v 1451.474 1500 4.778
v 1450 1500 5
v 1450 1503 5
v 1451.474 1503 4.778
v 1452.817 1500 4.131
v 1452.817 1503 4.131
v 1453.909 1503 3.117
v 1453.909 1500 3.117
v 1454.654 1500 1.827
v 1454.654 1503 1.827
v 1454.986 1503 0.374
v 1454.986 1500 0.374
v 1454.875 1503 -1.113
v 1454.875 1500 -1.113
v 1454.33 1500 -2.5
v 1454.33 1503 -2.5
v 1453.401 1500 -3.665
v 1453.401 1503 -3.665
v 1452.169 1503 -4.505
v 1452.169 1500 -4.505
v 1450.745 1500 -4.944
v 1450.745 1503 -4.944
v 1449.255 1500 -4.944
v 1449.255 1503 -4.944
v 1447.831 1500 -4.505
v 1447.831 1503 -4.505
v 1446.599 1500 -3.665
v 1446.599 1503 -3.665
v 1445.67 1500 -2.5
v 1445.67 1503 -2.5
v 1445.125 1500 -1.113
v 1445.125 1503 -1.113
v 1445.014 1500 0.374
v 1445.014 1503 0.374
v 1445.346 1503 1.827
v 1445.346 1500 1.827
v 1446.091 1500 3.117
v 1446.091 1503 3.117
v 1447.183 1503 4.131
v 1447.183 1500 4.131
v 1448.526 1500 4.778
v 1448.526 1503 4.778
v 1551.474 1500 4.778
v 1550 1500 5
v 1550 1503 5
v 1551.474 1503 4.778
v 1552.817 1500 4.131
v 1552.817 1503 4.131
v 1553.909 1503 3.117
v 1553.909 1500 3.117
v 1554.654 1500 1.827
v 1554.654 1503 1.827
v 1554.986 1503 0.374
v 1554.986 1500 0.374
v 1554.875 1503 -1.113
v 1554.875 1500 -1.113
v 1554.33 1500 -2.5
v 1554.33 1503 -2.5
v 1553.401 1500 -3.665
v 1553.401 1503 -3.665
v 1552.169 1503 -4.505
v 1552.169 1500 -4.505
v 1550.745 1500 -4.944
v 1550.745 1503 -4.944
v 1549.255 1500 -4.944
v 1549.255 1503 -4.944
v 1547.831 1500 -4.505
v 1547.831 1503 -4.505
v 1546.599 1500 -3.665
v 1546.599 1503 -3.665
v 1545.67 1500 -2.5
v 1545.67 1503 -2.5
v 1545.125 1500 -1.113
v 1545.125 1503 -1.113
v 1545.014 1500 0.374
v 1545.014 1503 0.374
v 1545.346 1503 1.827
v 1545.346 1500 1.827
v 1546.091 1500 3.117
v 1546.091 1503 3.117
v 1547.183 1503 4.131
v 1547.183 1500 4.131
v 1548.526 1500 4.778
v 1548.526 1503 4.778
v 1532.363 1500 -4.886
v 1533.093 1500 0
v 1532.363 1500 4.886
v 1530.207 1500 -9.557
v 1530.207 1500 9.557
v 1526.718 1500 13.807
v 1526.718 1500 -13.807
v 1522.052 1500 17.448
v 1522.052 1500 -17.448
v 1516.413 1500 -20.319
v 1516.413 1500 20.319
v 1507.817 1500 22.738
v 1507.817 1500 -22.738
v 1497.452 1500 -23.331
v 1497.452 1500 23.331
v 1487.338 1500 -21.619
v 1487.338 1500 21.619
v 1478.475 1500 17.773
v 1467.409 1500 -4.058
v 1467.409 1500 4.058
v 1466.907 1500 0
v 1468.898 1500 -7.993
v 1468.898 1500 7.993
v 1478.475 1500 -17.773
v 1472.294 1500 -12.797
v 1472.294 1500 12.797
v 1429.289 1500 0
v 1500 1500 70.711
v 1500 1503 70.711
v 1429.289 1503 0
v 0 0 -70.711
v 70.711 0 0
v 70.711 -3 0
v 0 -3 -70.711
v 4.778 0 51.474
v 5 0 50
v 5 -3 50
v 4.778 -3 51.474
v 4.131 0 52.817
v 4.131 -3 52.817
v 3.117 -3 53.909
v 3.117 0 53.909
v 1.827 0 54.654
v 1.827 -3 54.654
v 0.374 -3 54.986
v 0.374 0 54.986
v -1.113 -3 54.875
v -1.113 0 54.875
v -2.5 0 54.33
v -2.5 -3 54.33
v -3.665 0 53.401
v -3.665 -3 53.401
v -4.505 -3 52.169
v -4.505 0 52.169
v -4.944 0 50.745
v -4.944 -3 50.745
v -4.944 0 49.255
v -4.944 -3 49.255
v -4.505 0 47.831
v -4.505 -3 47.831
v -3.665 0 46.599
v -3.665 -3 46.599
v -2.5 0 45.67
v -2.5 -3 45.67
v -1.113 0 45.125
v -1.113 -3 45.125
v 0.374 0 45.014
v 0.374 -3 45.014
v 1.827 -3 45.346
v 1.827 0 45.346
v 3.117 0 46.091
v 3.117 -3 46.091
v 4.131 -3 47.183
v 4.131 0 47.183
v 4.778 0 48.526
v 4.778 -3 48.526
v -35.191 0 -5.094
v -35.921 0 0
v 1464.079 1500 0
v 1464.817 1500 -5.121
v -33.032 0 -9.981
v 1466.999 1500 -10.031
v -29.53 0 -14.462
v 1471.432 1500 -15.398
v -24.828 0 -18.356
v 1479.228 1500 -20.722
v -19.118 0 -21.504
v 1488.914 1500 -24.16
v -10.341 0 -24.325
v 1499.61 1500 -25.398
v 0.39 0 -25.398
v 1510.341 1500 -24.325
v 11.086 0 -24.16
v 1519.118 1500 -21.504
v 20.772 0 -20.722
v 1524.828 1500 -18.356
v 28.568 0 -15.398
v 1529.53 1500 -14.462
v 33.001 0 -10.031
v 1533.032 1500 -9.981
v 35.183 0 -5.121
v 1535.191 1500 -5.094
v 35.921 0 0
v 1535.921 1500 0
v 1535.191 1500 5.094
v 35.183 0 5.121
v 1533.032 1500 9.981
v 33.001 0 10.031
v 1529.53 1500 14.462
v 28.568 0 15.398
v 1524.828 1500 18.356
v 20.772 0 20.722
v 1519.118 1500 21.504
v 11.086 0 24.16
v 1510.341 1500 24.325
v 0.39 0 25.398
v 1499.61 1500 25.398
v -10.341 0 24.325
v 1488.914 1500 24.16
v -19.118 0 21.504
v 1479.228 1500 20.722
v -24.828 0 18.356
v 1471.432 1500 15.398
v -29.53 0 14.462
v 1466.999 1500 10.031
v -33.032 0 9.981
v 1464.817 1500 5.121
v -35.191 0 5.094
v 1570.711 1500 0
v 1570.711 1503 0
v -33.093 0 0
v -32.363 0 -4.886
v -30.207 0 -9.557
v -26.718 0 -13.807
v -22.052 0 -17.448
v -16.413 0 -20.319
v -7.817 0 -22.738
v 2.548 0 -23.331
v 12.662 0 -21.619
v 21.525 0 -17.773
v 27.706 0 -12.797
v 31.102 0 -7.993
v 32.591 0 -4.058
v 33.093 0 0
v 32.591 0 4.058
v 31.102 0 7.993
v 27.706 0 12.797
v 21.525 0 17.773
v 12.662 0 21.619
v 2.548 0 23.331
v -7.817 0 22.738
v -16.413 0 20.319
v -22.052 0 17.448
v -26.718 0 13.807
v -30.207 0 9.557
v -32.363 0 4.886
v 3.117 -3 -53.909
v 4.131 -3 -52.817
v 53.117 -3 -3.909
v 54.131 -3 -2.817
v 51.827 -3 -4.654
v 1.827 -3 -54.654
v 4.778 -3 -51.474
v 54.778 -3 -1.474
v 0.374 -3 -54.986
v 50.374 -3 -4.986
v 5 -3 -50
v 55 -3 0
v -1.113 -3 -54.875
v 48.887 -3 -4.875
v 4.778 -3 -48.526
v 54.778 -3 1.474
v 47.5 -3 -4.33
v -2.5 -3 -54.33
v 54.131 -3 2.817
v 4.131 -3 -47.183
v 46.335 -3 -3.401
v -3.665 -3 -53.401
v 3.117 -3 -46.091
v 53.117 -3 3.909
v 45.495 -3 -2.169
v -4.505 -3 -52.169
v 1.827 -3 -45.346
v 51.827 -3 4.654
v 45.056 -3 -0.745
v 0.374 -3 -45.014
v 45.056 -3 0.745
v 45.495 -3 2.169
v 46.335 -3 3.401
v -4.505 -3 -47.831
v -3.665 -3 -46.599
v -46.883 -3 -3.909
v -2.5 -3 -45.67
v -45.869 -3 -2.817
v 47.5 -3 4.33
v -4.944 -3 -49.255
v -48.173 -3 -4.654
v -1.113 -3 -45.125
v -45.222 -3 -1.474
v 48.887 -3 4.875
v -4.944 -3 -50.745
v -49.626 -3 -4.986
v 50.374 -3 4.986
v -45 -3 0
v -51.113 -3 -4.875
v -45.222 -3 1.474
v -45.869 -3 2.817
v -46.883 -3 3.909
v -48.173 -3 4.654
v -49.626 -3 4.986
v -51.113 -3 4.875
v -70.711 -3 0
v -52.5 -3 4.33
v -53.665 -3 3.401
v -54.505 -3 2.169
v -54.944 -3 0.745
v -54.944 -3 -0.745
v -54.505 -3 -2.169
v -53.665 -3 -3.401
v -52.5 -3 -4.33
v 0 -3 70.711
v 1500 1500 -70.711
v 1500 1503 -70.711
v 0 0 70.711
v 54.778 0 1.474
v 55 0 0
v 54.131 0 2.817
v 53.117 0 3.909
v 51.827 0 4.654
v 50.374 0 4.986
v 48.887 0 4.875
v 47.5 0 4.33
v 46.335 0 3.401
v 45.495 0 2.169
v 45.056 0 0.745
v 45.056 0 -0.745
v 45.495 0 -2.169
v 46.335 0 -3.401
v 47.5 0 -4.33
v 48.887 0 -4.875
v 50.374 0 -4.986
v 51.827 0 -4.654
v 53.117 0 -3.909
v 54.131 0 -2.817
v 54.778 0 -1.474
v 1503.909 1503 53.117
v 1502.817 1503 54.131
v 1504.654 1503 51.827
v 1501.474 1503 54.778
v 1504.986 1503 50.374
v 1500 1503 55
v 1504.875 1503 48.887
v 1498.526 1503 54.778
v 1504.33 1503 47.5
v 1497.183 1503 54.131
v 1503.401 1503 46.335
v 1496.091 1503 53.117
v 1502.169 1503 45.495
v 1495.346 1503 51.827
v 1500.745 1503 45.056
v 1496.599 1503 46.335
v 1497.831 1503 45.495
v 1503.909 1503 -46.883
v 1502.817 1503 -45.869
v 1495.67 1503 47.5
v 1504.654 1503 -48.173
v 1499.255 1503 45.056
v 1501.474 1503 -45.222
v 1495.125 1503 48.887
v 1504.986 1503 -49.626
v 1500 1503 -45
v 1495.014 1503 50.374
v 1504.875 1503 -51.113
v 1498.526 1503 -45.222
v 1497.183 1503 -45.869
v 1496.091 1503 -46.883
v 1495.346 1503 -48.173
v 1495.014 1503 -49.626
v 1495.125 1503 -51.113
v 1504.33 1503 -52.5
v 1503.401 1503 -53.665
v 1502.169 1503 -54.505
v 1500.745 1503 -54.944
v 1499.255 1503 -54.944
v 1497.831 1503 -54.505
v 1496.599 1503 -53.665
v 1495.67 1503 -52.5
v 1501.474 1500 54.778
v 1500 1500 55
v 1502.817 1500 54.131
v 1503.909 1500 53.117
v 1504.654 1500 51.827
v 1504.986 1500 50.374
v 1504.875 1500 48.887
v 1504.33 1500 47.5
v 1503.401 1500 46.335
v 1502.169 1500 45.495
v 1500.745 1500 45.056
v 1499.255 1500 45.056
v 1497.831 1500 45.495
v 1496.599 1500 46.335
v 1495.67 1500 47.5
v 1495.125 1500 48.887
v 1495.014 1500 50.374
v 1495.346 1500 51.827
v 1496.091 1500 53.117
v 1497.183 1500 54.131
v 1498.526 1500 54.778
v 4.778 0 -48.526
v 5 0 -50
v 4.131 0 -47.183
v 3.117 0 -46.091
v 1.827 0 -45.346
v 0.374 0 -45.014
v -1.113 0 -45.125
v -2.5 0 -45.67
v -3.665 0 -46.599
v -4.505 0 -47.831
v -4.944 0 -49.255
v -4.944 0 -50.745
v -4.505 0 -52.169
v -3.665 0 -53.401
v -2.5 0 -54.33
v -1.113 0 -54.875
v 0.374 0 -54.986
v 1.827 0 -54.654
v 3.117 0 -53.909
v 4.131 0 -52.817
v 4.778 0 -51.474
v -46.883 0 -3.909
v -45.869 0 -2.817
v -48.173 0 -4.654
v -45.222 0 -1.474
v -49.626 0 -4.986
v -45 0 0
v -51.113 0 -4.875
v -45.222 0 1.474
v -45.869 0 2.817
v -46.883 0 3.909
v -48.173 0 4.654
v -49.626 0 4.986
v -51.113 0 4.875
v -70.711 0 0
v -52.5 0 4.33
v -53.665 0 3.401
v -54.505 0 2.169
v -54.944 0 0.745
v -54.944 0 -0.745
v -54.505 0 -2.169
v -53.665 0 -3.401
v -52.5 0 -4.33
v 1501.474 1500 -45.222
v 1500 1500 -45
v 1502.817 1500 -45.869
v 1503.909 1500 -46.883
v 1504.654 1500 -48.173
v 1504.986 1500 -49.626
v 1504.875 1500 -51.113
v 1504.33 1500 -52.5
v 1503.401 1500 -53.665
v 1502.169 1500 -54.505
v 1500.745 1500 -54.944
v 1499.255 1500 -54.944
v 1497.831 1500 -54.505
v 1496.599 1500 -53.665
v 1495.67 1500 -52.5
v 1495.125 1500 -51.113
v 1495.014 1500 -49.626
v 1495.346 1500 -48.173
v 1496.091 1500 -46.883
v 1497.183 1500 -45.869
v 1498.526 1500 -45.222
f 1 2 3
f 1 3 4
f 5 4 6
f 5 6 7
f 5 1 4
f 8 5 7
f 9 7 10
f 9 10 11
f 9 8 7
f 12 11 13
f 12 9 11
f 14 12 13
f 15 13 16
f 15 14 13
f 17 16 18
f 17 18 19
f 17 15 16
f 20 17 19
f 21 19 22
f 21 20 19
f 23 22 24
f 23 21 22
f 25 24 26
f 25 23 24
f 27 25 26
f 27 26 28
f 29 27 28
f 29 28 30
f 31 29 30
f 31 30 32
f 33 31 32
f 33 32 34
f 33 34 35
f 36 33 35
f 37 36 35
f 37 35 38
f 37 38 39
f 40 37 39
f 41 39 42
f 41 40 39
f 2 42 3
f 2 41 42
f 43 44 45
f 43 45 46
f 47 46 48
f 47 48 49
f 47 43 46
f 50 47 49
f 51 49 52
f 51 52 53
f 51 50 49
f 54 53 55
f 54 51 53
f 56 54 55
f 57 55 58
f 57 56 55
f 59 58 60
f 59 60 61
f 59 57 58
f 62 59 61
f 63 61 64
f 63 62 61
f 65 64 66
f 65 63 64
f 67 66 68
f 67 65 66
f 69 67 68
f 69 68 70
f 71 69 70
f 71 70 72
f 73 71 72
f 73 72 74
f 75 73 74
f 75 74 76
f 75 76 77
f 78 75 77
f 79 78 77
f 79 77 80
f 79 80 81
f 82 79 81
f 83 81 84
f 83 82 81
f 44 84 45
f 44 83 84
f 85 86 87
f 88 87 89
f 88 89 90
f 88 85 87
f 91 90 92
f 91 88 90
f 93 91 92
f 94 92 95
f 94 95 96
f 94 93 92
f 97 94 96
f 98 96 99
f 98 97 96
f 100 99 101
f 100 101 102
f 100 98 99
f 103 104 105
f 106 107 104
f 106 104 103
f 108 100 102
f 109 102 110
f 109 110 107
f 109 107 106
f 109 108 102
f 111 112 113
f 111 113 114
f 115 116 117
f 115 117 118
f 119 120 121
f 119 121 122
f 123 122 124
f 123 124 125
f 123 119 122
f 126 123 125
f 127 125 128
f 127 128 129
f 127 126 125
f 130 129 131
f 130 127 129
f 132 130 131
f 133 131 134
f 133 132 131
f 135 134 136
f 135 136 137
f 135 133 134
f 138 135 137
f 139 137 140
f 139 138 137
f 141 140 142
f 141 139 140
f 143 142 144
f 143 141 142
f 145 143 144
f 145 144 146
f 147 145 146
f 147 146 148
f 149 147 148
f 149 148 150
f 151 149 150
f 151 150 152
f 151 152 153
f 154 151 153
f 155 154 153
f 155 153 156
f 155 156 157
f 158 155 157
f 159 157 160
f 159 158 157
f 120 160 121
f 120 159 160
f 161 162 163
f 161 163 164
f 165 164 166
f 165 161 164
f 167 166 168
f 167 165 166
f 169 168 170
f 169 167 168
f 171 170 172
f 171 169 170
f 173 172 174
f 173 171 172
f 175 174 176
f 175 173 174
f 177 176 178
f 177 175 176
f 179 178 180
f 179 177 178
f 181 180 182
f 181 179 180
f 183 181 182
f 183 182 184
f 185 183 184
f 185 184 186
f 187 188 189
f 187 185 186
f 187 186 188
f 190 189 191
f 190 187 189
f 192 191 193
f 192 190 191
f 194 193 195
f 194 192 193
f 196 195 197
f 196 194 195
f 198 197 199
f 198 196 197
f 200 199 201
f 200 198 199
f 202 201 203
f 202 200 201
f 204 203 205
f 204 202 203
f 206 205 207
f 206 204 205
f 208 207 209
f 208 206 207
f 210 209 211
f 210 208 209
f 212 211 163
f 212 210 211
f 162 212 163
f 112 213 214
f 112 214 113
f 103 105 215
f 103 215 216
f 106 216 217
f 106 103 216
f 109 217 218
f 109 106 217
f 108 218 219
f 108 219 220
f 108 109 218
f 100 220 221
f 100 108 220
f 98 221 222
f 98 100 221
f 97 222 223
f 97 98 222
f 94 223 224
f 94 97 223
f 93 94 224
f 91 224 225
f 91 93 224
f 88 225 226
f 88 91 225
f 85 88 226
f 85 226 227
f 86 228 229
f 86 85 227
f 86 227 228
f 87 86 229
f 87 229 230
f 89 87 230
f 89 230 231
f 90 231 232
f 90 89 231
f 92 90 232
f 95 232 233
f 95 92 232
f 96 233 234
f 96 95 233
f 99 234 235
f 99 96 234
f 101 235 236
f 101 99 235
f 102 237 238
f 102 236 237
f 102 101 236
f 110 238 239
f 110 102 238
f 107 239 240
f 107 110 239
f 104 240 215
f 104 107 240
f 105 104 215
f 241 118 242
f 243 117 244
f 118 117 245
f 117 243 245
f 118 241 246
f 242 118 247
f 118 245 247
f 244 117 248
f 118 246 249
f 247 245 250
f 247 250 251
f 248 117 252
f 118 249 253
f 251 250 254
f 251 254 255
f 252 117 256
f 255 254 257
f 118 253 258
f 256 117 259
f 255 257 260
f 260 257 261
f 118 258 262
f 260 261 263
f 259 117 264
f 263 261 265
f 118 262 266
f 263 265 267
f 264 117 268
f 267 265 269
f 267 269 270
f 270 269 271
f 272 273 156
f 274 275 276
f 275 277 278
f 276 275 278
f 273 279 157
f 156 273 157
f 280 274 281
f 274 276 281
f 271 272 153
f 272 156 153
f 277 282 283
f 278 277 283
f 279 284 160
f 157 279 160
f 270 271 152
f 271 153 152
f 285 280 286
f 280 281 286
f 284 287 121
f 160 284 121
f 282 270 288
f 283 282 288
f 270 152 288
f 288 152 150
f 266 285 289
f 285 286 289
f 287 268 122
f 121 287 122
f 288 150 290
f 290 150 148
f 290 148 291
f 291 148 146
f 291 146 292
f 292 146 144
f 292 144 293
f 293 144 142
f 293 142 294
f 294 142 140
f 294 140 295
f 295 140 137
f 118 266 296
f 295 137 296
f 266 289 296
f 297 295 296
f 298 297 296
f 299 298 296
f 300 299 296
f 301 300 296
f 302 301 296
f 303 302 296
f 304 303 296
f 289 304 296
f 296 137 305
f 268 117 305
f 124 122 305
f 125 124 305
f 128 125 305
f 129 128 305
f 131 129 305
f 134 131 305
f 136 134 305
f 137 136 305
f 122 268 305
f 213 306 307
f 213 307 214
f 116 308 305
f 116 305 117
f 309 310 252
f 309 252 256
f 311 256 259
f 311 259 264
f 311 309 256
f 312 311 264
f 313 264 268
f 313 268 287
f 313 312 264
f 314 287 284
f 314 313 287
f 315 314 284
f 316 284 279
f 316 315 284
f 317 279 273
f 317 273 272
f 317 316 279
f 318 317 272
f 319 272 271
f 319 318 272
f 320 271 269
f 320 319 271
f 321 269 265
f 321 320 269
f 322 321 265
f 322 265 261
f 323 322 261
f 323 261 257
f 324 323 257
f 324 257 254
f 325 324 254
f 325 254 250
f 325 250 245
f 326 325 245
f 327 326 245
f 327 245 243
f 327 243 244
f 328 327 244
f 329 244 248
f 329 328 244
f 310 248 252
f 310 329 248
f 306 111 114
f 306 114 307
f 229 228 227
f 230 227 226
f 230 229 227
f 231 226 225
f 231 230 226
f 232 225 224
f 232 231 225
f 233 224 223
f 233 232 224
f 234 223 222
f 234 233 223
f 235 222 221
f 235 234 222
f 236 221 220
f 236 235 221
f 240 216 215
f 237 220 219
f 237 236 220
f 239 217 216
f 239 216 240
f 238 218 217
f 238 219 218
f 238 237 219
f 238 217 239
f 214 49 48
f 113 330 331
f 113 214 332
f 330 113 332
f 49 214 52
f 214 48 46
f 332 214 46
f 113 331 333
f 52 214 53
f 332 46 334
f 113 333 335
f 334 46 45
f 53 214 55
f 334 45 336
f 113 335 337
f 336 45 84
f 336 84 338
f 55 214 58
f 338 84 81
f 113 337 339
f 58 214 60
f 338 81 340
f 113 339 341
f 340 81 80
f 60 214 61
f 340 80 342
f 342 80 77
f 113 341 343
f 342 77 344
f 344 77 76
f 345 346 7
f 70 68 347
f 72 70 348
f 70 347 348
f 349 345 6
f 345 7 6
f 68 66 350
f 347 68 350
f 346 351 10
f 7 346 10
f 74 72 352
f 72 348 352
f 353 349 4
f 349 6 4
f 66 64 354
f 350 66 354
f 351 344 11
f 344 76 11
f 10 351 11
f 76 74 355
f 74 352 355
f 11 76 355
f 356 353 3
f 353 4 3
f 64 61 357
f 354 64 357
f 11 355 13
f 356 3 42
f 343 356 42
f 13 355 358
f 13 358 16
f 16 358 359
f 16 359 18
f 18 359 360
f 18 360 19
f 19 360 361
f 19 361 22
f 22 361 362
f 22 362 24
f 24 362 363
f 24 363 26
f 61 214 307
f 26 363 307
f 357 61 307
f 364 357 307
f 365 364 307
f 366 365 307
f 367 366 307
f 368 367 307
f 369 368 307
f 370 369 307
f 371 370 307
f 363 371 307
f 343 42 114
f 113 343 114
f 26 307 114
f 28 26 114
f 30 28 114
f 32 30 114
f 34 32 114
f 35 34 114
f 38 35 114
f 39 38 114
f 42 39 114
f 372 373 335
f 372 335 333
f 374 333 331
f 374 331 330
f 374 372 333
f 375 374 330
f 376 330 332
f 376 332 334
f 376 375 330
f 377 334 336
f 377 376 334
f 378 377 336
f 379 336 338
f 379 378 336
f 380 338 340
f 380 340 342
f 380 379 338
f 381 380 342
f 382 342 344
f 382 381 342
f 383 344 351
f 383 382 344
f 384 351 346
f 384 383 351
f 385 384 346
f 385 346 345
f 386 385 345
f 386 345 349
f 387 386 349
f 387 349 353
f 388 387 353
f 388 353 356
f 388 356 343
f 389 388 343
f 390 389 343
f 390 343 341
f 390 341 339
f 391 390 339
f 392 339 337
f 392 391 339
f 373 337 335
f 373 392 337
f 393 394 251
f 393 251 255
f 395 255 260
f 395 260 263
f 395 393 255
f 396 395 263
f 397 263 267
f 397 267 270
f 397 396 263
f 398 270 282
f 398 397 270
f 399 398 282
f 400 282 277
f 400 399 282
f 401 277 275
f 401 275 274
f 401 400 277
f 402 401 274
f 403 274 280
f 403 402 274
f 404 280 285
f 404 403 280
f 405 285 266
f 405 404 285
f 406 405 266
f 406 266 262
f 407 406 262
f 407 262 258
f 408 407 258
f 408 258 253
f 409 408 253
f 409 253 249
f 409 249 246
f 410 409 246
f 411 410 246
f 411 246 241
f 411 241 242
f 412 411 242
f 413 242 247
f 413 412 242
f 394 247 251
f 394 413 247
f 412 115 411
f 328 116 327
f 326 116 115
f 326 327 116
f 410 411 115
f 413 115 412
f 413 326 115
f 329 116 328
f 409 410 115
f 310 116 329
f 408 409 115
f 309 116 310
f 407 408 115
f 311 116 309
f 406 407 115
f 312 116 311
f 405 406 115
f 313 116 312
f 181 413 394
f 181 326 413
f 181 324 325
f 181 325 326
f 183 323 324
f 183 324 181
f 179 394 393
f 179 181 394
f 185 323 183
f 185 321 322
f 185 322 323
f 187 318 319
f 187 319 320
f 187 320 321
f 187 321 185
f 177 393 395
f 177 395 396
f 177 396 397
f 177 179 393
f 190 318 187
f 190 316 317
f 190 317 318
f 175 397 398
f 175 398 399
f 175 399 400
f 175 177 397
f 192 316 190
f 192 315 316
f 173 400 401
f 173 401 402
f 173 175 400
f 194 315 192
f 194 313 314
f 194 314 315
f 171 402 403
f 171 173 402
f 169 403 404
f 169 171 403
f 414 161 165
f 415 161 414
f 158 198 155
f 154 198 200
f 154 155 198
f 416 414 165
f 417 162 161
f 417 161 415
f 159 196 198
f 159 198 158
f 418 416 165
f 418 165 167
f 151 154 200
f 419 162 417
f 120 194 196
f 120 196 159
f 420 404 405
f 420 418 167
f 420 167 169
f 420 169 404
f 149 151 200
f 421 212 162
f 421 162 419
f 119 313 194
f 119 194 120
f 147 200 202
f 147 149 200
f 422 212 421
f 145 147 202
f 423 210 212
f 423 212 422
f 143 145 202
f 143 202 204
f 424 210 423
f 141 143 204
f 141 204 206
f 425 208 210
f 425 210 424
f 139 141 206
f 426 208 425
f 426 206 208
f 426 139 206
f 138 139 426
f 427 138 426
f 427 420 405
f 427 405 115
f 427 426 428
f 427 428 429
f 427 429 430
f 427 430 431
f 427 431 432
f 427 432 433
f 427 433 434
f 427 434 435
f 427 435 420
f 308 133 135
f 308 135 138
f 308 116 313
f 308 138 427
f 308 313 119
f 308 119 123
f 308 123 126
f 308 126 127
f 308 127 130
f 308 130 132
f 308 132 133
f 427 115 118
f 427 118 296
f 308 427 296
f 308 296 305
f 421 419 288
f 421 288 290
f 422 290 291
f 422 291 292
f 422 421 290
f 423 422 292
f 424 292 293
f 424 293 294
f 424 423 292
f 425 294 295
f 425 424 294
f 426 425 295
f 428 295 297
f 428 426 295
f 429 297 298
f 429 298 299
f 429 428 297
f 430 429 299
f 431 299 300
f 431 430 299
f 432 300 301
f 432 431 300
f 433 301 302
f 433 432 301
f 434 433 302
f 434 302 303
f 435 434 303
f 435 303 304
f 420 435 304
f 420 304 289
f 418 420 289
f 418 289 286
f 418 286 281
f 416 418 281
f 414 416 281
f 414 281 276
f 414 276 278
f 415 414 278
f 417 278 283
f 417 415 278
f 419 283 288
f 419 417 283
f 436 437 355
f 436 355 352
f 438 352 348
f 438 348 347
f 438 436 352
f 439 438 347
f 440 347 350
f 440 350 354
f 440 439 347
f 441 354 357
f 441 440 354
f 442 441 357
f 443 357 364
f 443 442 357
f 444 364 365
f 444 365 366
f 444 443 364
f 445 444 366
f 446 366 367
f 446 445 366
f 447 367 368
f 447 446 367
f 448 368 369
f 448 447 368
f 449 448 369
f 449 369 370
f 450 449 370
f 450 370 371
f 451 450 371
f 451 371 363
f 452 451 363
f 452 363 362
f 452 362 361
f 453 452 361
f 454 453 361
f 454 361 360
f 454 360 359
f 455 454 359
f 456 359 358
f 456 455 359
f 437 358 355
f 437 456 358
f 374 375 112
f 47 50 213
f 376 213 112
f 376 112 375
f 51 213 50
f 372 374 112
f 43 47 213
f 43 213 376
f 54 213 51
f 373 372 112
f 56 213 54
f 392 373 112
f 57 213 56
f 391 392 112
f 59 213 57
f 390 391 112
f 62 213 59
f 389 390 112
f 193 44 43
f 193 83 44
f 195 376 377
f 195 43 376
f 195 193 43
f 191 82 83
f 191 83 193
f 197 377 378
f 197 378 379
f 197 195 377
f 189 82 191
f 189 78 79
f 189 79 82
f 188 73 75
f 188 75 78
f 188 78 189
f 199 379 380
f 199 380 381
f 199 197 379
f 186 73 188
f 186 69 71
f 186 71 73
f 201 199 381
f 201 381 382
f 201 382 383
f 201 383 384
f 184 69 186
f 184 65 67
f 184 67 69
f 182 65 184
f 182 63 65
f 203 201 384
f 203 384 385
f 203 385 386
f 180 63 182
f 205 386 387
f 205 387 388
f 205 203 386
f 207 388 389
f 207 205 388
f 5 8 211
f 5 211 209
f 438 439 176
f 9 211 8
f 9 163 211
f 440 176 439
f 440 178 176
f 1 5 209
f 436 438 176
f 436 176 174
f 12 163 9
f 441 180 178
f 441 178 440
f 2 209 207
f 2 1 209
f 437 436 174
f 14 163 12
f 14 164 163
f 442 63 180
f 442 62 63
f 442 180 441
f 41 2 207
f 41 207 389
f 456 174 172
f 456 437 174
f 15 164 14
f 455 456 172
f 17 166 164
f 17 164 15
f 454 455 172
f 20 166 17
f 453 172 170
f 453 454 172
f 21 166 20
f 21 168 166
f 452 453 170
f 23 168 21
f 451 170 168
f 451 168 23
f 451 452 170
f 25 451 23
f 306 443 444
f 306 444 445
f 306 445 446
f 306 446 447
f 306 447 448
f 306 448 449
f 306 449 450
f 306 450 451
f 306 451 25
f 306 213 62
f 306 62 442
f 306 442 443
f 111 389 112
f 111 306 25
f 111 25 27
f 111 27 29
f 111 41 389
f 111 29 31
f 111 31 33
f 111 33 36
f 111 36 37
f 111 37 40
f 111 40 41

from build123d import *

# Parameters (mm, degrees)
CORTAR_EXTRUIR1_DEPTH      = 2173.26884775
CORTAR_EXTRUIR1_DEPTH_BACK = 2173.26884775
CROQUIS3_R                 = 5
SALIENTE_EXTRUIR1_DEPTH    = 3
CROQUIS9_R                 = 5
CROQUIS9_RX                = 35.921024484
CROQUIS9_RY                = 25.4
CROQUIS9_RX_2              = 33.09259736
CROQUIS9_RY_2              = 23.4
SALIENTE_EXTRUIR5_DEPTH    = 3


with BuildPart() as part:
    # Croquis1 → Revolución1 (revolve)
    with BuildSketch(Plane.XY, mode=Mode.PRIVATE) as revoluci_n1_sk:
        Polygon((1535.921024484, 1500), (0, -35.921024484), (-1.414213562, -34.506810922), (1534.506810922, 1501.414213562), align=None)
    revolve(revoluci_n1_sk.sketch.rotate(Axis((1500, 1500, 0), (-0.7071067811865476, -0.7071067811865476, 0)), 180), axis=Axis((1500, 1500, 0), (-0.7071067811865476, -0.7071067811865476, 0)))

    # Croquis2 → Cortar-Extruir1 (cut, two sides)
    with BuildSketch(Plane.XY) as cortar_extruir1_sk:
        Polygon((-35.921024484, 0), (35.921024484, 0), (0, -35.921024484), align=None)
        Polygon((1535.921024484, 1500), (1464.078975516, 1500), (1500, 1535.921024484), align=None)
    extrude(amount=CORTAR_EXTRUIR1_DEPTH, mode=Mode.SUBTRACT)
    extrude(cortar_extruir1_sk.sketch, amount=-CORTAR_EXTRUIR1_DEPTH_BACK, mode=Mode.SUBTRACT)

    # Croquis3 → Saliente-Extruir1 (add)
    with BuildSketch(Plane.XZ):
        Polygon((-70.710678119, 0), (0, 70.710678119), (70.710678119, 0), (0, -70.710678119), align=None)
        with Locations((-50, 0)):
            Circle(CROQUIS3_R, mode=Mode.SUBTRACT)
        with Locations((0, 50)):
            Circle(CROQUIS3_R, mode=Mode.SUBTRACT)
        with Locations((50, 0)):
            Circle(CROQUIS3_R, mode=Mode.SUBTRACT)
        with Locations((0, -50)):
            Circle(CROQUIS3_R, mode=Mode.SUBTRACT)
    extrude(amount=SALIENTE_EXTRUIR1_DEPTH)

    # Croquis9 → Saliente-Extruir5 (add)
    with BuildSketch(Plane(origin=(0, 1500, 0), x_dir=(1, 0, 0), z_dir=(0, 1, 0))):
        Polygon((1500, 70.710678119), (1570.710678119, 0), (1500, -70.710678119), (1429.289321881, 0), align=None)
        with Locations(Location((1450, 0, 0), (0, 0, 270))):
            Circle(CROQUIS9_R, mode=Mode.SUBTRACT)
        with Locations(Location((1500, -50, 0), (0, 0, 270))):
            Circle(CROQUIS9_R, mode=Mode.SUBTRACT)
        with Locations(Location((1550, 0, 0), (0, 0, 270))):
            Circle(CROQUIS9_R, mode=Mode.SUBTRACT)
        with Locations(Location((1500, 50, 0), (0, 0, 270))):
            Circle(CROQUIS9_R, mode=Mode.SUBTRACT)
        with Locations((1500, 0)):
            Ellipse(CROQUIS9_RX, CROQUIS9_RY, mode=Mode.SUBTRACT)
        with Locations((1500, 0)):
            Ellipse(CROQUIS9_RX, CROQUIS9_RY)
        with Locations((1500, 0)):
            Ellipse(CROQUIS9_RX_2, CROQUIS9_RY_2, mode=Mode.SUBTRACT)
        with Locations((1500, 0)):
            Ellipse(CROQUIS9_RX_2, CROQUIS9_RY_2)
    extrude(amount=SALIENTE_EXTRUIR5_DEPTH)


solid = part.part
